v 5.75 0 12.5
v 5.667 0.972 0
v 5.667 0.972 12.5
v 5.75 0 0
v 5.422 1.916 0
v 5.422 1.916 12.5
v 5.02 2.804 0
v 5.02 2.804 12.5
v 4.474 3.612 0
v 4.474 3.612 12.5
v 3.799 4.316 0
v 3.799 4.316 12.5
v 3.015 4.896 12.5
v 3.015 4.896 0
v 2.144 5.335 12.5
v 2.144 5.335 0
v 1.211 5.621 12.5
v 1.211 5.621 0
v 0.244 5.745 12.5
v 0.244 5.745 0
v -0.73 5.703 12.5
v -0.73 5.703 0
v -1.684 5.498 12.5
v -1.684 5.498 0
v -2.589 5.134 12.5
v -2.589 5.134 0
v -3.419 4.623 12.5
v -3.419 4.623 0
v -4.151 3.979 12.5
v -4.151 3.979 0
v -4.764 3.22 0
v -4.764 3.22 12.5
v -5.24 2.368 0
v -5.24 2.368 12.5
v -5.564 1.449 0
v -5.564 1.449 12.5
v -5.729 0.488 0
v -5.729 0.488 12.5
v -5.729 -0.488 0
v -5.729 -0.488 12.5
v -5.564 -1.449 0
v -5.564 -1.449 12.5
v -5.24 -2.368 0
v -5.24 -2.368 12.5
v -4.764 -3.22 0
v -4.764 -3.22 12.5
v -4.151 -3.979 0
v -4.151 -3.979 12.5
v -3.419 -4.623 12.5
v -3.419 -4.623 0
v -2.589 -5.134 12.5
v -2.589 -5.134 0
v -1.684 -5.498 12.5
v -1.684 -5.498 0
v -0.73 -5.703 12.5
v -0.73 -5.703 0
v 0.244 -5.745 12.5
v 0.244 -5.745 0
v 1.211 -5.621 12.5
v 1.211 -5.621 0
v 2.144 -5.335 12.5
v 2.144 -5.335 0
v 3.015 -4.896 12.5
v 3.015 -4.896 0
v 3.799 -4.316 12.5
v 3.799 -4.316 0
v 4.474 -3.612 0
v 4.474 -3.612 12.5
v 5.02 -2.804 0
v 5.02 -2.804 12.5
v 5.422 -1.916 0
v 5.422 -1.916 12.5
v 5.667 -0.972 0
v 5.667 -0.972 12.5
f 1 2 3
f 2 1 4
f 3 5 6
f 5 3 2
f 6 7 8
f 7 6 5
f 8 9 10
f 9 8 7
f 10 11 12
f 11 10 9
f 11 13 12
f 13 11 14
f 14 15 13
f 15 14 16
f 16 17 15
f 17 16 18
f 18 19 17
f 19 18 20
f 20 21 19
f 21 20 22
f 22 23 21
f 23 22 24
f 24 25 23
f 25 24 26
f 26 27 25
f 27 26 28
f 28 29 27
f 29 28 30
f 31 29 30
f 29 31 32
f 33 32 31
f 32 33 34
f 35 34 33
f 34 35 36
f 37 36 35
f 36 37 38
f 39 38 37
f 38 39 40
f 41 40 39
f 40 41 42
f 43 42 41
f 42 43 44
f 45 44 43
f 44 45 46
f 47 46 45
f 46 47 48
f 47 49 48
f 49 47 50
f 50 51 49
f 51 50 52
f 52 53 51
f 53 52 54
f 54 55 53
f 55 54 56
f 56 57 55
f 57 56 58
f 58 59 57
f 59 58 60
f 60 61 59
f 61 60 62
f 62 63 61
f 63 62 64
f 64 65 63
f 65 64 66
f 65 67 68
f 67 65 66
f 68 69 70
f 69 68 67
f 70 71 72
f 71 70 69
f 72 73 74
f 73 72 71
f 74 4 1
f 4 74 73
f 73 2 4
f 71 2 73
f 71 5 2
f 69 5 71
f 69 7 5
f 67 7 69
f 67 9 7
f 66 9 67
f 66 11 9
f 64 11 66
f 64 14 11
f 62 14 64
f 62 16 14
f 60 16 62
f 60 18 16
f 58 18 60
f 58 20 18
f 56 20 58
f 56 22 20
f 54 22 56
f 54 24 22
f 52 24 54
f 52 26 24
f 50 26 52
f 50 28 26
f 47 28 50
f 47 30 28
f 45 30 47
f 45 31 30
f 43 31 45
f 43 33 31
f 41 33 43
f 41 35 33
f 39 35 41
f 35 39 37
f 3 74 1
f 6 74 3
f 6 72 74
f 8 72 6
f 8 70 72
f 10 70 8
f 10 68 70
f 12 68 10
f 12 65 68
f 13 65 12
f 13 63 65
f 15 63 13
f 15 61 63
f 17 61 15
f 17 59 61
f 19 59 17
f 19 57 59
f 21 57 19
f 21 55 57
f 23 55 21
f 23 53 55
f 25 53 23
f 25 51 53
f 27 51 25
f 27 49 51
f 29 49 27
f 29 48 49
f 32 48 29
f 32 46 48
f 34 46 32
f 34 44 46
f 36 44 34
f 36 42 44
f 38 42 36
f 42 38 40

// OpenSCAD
// all measurements are in millimeters
//These are specified diameters. No attempt to compensate for shrinkage.

Cylinder_diameter = 11.5;
Cylinder_hight = 12.5;

//Cylinder_offset = Box_width/3;
//Cutoff_hight = 32;


 translate([0,0,0])
 cylinder(d = Cylinder_diameter, h = Cylinder_hight, $fs = 1,$fa  = 1); 
    
